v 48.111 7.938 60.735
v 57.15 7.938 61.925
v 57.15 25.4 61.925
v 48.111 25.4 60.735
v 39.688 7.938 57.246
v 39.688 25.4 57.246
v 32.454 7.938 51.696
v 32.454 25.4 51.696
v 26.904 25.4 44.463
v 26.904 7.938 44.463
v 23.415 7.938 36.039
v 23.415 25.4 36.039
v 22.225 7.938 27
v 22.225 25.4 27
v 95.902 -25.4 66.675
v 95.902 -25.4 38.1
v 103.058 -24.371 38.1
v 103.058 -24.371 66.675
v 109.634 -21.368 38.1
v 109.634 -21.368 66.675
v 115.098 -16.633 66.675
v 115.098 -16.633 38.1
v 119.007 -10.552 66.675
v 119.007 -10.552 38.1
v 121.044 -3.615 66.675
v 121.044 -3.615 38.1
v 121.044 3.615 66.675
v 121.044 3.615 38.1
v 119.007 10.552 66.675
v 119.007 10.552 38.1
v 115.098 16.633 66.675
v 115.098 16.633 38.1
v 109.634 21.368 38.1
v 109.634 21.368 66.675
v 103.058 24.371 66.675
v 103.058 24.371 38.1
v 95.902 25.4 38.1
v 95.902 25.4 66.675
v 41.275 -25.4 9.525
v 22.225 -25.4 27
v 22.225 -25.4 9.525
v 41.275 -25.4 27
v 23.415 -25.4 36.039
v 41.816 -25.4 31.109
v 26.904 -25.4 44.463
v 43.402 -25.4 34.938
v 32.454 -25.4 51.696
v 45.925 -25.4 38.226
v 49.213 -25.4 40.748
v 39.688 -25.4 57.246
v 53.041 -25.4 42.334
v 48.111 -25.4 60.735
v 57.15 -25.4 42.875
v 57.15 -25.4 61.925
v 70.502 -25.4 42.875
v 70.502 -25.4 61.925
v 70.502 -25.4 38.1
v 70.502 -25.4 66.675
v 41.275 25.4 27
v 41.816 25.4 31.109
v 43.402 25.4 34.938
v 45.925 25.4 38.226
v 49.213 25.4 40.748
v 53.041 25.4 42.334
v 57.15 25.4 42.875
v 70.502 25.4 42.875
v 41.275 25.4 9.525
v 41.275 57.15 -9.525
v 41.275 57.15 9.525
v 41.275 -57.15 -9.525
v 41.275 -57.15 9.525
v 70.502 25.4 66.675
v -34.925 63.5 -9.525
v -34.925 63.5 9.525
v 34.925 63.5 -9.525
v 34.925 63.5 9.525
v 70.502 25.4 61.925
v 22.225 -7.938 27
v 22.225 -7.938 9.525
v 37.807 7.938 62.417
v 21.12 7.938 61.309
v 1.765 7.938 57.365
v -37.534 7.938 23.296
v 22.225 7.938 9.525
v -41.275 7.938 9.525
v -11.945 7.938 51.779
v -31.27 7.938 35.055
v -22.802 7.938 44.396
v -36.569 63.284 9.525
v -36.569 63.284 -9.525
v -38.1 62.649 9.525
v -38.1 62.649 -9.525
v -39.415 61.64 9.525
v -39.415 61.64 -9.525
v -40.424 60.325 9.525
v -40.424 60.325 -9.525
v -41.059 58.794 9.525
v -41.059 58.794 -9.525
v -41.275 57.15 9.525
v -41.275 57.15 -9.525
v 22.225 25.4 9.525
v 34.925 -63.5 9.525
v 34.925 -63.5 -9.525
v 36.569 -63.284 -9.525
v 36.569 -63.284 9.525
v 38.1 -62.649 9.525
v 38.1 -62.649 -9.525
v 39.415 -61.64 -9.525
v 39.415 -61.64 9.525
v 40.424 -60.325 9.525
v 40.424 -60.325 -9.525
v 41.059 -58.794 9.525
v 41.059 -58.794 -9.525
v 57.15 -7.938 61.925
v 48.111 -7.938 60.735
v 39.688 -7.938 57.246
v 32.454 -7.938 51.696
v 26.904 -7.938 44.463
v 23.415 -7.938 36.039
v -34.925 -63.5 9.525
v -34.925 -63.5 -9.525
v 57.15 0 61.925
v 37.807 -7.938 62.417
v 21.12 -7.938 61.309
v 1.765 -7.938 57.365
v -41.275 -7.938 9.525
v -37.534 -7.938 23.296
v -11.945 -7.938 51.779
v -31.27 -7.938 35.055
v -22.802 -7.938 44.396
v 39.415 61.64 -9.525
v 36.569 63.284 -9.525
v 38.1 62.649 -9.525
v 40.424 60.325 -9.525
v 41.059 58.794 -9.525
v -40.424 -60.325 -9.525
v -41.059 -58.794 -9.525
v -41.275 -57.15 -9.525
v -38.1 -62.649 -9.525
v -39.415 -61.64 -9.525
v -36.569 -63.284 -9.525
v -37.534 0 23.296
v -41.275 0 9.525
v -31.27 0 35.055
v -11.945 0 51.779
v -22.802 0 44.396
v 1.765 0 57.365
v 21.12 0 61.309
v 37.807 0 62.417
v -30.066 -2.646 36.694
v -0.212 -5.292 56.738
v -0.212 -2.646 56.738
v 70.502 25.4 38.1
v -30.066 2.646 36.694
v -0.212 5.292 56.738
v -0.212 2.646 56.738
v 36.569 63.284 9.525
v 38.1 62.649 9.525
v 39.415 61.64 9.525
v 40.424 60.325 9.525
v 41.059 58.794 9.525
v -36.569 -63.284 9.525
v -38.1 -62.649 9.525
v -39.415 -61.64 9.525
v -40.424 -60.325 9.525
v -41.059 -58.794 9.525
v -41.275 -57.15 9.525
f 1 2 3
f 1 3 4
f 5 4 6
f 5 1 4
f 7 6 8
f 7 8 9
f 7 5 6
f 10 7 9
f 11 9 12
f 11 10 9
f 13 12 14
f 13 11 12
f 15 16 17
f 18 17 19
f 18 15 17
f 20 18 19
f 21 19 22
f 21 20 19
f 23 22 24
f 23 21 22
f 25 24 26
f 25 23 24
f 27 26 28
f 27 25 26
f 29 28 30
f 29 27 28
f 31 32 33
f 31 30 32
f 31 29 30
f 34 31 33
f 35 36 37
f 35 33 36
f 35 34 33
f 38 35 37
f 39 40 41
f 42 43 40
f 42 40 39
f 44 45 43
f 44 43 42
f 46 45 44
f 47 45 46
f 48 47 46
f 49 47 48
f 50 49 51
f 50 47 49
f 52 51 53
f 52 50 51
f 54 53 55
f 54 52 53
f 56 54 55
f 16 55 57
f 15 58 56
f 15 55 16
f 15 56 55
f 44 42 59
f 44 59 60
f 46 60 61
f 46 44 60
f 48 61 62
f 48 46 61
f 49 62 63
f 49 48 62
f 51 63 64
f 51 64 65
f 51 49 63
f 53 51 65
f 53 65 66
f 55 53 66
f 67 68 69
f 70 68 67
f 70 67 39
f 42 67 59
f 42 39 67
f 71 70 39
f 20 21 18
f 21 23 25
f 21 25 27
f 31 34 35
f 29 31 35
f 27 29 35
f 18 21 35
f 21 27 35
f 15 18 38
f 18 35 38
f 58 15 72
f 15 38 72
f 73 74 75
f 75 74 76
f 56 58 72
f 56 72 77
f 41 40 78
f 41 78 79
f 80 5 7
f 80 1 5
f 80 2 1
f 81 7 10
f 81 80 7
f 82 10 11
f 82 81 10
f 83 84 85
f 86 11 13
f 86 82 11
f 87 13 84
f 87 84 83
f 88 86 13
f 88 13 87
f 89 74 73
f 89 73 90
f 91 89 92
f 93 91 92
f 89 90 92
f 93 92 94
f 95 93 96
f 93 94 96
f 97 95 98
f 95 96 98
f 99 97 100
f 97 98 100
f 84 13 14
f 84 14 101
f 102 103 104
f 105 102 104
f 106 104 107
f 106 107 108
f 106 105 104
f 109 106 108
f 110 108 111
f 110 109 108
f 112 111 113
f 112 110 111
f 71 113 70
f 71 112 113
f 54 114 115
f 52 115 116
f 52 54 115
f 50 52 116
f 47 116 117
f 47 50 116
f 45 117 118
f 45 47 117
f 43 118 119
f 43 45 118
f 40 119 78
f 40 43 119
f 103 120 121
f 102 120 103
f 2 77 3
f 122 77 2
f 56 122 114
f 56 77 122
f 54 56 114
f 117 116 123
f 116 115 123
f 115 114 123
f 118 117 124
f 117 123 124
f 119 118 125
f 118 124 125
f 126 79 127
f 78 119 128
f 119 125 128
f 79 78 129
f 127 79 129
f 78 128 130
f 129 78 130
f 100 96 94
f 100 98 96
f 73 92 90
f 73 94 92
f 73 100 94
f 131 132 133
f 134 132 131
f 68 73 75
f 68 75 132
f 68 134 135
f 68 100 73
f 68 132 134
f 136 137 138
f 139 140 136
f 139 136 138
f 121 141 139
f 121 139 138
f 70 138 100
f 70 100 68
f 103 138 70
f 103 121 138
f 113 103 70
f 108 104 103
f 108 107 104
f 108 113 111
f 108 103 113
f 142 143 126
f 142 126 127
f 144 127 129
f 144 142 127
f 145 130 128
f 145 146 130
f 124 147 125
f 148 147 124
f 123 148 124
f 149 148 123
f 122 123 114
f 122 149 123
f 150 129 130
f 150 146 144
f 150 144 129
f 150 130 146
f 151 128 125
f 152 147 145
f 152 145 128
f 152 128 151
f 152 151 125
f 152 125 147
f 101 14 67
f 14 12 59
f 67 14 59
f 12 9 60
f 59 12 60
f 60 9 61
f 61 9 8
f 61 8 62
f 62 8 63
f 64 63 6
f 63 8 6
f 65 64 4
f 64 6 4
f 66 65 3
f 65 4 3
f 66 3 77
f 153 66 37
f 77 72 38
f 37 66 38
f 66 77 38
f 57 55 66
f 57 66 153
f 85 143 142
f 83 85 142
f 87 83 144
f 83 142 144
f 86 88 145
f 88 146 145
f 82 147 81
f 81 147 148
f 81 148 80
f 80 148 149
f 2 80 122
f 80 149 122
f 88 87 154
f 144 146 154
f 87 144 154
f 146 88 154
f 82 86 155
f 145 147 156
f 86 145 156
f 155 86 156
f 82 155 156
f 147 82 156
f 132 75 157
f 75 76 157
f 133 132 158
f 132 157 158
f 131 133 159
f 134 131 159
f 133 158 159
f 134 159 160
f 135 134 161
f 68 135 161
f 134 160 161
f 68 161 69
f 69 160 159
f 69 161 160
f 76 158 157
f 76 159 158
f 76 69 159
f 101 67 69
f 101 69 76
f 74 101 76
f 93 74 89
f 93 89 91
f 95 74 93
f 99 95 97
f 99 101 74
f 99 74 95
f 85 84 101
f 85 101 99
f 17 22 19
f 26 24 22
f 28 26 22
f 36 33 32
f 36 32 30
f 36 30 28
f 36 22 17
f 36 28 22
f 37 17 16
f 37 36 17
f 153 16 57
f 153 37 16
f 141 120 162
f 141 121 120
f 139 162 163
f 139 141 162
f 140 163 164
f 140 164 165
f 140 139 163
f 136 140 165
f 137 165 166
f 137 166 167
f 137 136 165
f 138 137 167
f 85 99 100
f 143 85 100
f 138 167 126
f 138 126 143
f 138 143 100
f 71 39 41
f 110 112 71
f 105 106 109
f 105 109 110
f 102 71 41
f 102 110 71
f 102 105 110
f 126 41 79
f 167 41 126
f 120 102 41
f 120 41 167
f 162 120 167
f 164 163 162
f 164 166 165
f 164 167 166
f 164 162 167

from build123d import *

# Parameters (mm, degrees)
F1_DEPTH = 63.5
F2_DEPTH = 25.4
F3_DEPTH = 7.9375
F0_W     = 25.4
F0_H     = 28.575
F5_R     = 6.35


with BuildPart() as f1:
    # F0 (on Front) → F1 (new body, symmetric)
    with BuildSketch(Plane.XZ):
        Polygon((22.225, 9.525), (-41.275, 9.525), (-41.275, -9.525), (41.275, -9.525), (41.275, 9.525), align=None)
    extrude(amount=F1_DEPTH, both=True)

    # F0 (on Front) → F2 (join, symmetric)
    with BuildSketch(Plane.XZ):
        with BuildLine():
            Line((22.225, 27.0002), (22.225, 9.525))
            Line((22.225, 9.525), (41.275, 9.525))
            Line((41.275, 9.525), (41.275, 27.0002))
            ThreePointArc((41.275, 27.0002), (45.92468, 38.22552), (57.15, 42.8752))
            Line((57.15, 42.8752), (70.502212, 42.8752))
            Line((70.502212, 42.8752), (70.502212, 61.9252))
            Line((70.502212, 61.9252), (57.15, 61.9252))
            ThreePointArc((57.15, 61.9252), (32.454296, 51.695904), (22.225, 27.0002))
        make_face()
        Polygon((70.502212, 66.675), (70.502212, 61.9252), (70.502212, 42.8752), (70.502212, 38.1), (95.902212, 38.1), (95.902212, 66.675), align=None)
    extrude(amount=F2_DEPTH, both=True)

    # F0 (on Front) → F3 (join, symmetric)
    with BuildSketch(Plane.XZ):
        with BuildLine():
            add(Edge.make_bspline(
                [(-41.275, 9.525), (-36.434188, 37.679806), (-16.919576, 66.744119), (57.15, 61.9252)],
                knots=[0, 0, 0, 0, 111.504536, 111.504536, 111.504536, 111.504536], degree=3))
            Line((-41.275, 9.525), (22.225, 9.525))
            Line((22.225, 9.525), (22.225, 27.0002))
            ThreePointArc((22.225, 27.0002), (32.454296, 51.695904), (57.15, 61.9252))
        make_face()
    extrude(amount=F3_DEPTH, both=True)

    # F0 (on Front) → F4 (revolve)
    with BuildSketch(Plane.XZ):
        with Locations((108.602212, 52.3875)):
            Rectangle(F0_W, F0_H)
    revolve(axis=Axis((95.902212, 0, 52.3875), (0, 0, 1)))

    # F5
    f5_edges = [f1.edges().sort_by_distance(p)[0] for p in [
        (41.275, -63.5, 0),
        (-41.275, -63.5, 0),
        (41.275, 63.5, 0),
        (-41.275, 63.5, 0),
    ]]
    fillet(f5_edges, radius=F5_R)


solid = f1.part
